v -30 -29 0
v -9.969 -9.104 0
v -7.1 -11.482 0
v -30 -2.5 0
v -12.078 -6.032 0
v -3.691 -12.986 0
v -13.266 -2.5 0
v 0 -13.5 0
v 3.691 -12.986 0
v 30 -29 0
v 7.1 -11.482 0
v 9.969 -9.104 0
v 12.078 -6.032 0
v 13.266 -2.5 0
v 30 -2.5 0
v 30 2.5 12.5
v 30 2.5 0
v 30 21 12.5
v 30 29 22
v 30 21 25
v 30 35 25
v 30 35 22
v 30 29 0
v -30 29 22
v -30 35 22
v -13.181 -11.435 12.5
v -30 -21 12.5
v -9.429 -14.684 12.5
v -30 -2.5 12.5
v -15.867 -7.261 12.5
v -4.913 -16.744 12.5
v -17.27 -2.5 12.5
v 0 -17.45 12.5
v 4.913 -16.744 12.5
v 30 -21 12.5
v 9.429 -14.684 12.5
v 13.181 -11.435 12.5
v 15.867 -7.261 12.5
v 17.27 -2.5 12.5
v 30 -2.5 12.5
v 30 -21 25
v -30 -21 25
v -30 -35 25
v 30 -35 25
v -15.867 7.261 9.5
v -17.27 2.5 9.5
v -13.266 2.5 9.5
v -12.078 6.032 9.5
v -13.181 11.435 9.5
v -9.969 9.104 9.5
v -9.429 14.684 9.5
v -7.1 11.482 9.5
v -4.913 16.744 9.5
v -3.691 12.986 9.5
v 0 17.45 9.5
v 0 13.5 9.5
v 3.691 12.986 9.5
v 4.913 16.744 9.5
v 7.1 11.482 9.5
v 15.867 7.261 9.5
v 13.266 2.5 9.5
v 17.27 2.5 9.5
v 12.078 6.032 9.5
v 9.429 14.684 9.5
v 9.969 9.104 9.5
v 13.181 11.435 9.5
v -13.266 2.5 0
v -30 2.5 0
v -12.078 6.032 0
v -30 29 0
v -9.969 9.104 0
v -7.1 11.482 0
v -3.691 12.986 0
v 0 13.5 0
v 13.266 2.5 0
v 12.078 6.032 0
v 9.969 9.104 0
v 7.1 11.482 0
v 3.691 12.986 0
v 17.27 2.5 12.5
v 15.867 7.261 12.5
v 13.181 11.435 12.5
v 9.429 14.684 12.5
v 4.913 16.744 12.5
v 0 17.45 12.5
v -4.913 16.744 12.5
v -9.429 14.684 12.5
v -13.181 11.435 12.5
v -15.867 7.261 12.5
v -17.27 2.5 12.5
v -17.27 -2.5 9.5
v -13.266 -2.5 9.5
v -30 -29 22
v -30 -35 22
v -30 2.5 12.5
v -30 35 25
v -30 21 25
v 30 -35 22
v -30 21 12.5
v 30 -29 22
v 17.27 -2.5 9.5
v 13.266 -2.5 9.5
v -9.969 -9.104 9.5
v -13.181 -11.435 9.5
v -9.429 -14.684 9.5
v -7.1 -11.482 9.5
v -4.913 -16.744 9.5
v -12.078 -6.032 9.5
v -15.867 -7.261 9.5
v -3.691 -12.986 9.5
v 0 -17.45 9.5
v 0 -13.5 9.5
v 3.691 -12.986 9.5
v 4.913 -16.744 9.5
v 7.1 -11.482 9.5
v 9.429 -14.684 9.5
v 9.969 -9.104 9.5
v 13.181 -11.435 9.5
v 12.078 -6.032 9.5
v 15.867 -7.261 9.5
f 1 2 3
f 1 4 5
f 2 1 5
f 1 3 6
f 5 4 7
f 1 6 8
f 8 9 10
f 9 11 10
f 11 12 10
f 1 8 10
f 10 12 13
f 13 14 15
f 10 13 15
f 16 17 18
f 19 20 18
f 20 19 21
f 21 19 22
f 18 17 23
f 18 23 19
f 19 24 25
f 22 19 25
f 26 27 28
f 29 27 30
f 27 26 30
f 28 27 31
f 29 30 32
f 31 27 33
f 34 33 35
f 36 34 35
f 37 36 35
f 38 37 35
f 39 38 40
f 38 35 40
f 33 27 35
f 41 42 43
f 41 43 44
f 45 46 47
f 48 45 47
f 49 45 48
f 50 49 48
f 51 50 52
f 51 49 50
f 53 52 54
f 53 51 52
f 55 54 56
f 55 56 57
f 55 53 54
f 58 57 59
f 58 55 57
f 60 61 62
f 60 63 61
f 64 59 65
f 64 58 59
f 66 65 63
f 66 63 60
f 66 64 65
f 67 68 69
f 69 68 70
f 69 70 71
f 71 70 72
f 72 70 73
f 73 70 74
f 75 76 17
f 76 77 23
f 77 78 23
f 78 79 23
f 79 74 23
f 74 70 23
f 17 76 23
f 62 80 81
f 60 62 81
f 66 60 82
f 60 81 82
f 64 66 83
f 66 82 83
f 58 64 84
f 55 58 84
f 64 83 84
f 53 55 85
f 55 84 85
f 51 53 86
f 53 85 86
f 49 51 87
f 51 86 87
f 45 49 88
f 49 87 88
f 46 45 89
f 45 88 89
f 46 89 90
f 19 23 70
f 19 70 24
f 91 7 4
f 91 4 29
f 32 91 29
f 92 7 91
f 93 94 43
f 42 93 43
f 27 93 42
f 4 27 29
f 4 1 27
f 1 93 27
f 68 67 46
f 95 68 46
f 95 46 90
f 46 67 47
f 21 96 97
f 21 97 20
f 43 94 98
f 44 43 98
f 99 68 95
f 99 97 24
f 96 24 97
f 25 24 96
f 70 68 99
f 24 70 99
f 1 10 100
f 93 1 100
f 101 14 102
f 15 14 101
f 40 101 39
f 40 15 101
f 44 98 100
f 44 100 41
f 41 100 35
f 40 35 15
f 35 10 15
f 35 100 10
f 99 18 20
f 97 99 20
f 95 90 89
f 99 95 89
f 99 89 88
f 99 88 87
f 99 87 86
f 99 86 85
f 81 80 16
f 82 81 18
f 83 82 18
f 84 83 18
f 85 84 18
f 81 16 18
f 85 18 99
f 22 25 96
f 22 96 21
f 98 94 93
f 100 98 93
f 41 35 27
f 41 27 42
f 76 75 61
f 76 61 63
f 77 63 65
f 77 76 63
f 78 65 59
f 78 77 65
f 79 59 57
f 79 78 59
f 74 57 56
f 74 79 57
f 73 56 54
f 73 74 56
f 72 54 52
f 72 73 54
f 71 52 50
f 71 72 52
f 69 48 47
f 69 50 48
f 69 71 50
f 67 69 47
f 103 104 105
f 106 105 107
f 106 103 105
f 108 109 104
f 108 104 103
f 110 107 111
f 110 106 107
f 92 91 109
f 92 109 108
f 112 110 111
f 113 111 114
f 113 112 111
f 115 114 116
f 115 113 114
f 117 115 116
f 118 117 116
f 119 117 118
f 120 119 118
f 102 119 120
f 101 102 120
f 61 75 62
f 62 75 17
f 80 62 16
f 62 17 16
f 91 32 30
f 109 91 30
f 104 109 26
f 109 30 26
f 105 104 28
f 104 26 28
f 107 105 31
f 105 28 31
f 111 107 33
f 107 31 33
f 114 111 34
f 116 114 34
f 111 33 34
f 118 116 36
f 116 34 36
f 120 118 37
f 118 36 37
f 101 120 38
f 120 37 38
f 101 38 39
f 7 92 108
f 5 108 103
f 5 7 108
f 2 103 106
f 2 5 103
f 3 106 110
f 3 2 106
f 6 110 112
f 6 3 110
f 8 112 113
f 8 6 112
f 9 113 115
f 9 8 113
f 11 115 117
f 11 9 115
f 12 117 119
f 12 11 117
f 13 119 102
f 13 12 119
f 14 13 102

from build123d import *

# Parameters (mm, degrees)
F0_W      = 60
F0_H      = 70
F0_R      = 13.5
F1_DEPTH  = 25
F2_W      = 6
F2_H      = 22
F3_DEPTH  = 60.001
F4_DEPTH  = 60.001
F5_W      = 42
F5_H      = 12.5
F6_DEPTH  = 60.001
F7_R      = 17.45
F8_DEPTH  = 3
F9_W      = 5
F9_H      = 12.5
F10_DEPTH = 60.001


with BuildPart() as f1:
    # F0 (on Top) → F1 (new body)
    with BuildSketch(Plane.XY):
        Rectangle(F0_W, F0_H)
        Circle(F0_R, mode=Mode.SUBTRACT)
    extrude(amount=F1_DEPTH)

    # F2 (on face) → F3 (cut, through all)
    with BuildSketch(Plane.YZ.offset(30)):
        with Locations((-32, 11)):
            Rectangle(F2_W, F2_H)
    extrude(amount=-F3_DEPTH, mode=Mode.SUBTRACT)

    # F2 (on face) → F4 (cut, through all)
    with BuildSketch(Plane.YZ.offset(30)):
        with Locations((-32, 11)):
            Rectangle(F2_W, F2_H)
        with Locations((32, 11)):
            Rectangle(F2_W, F2_H)
    extrude(amount=-F4_DEPTH, mode=Mode.SUBTRACT)

    # F5 (on face) → F6 (cut, through all)
    with BuildSketch(Plane.YZ.offset(30)):
        with Locations((0, 18.75)):
            Rectangle(F5_W, F5_H)
    extrude(amount=-F6_DEPTH, mode=Mode.SUBTRACT)

    # F7 (on face) → F8 (cut)
    with BuildSketch(Plane.XY.offset(12.5)):
        Circle(F7_R)
    extrude(amount=-F8_DEPTH, mode=Mode.SUBTRACT)

    # F9 (on face) → F10 (cut, through all)
    with BuildSketch(Plane.YZ.offset(30)):
        with Locations((0, 6.25)):
            Rectangle(F9_W, F9_H)
    extrude(amount=-F10_DEPTH, mode=Mode.SUBTRACT)


solid = f1.part
